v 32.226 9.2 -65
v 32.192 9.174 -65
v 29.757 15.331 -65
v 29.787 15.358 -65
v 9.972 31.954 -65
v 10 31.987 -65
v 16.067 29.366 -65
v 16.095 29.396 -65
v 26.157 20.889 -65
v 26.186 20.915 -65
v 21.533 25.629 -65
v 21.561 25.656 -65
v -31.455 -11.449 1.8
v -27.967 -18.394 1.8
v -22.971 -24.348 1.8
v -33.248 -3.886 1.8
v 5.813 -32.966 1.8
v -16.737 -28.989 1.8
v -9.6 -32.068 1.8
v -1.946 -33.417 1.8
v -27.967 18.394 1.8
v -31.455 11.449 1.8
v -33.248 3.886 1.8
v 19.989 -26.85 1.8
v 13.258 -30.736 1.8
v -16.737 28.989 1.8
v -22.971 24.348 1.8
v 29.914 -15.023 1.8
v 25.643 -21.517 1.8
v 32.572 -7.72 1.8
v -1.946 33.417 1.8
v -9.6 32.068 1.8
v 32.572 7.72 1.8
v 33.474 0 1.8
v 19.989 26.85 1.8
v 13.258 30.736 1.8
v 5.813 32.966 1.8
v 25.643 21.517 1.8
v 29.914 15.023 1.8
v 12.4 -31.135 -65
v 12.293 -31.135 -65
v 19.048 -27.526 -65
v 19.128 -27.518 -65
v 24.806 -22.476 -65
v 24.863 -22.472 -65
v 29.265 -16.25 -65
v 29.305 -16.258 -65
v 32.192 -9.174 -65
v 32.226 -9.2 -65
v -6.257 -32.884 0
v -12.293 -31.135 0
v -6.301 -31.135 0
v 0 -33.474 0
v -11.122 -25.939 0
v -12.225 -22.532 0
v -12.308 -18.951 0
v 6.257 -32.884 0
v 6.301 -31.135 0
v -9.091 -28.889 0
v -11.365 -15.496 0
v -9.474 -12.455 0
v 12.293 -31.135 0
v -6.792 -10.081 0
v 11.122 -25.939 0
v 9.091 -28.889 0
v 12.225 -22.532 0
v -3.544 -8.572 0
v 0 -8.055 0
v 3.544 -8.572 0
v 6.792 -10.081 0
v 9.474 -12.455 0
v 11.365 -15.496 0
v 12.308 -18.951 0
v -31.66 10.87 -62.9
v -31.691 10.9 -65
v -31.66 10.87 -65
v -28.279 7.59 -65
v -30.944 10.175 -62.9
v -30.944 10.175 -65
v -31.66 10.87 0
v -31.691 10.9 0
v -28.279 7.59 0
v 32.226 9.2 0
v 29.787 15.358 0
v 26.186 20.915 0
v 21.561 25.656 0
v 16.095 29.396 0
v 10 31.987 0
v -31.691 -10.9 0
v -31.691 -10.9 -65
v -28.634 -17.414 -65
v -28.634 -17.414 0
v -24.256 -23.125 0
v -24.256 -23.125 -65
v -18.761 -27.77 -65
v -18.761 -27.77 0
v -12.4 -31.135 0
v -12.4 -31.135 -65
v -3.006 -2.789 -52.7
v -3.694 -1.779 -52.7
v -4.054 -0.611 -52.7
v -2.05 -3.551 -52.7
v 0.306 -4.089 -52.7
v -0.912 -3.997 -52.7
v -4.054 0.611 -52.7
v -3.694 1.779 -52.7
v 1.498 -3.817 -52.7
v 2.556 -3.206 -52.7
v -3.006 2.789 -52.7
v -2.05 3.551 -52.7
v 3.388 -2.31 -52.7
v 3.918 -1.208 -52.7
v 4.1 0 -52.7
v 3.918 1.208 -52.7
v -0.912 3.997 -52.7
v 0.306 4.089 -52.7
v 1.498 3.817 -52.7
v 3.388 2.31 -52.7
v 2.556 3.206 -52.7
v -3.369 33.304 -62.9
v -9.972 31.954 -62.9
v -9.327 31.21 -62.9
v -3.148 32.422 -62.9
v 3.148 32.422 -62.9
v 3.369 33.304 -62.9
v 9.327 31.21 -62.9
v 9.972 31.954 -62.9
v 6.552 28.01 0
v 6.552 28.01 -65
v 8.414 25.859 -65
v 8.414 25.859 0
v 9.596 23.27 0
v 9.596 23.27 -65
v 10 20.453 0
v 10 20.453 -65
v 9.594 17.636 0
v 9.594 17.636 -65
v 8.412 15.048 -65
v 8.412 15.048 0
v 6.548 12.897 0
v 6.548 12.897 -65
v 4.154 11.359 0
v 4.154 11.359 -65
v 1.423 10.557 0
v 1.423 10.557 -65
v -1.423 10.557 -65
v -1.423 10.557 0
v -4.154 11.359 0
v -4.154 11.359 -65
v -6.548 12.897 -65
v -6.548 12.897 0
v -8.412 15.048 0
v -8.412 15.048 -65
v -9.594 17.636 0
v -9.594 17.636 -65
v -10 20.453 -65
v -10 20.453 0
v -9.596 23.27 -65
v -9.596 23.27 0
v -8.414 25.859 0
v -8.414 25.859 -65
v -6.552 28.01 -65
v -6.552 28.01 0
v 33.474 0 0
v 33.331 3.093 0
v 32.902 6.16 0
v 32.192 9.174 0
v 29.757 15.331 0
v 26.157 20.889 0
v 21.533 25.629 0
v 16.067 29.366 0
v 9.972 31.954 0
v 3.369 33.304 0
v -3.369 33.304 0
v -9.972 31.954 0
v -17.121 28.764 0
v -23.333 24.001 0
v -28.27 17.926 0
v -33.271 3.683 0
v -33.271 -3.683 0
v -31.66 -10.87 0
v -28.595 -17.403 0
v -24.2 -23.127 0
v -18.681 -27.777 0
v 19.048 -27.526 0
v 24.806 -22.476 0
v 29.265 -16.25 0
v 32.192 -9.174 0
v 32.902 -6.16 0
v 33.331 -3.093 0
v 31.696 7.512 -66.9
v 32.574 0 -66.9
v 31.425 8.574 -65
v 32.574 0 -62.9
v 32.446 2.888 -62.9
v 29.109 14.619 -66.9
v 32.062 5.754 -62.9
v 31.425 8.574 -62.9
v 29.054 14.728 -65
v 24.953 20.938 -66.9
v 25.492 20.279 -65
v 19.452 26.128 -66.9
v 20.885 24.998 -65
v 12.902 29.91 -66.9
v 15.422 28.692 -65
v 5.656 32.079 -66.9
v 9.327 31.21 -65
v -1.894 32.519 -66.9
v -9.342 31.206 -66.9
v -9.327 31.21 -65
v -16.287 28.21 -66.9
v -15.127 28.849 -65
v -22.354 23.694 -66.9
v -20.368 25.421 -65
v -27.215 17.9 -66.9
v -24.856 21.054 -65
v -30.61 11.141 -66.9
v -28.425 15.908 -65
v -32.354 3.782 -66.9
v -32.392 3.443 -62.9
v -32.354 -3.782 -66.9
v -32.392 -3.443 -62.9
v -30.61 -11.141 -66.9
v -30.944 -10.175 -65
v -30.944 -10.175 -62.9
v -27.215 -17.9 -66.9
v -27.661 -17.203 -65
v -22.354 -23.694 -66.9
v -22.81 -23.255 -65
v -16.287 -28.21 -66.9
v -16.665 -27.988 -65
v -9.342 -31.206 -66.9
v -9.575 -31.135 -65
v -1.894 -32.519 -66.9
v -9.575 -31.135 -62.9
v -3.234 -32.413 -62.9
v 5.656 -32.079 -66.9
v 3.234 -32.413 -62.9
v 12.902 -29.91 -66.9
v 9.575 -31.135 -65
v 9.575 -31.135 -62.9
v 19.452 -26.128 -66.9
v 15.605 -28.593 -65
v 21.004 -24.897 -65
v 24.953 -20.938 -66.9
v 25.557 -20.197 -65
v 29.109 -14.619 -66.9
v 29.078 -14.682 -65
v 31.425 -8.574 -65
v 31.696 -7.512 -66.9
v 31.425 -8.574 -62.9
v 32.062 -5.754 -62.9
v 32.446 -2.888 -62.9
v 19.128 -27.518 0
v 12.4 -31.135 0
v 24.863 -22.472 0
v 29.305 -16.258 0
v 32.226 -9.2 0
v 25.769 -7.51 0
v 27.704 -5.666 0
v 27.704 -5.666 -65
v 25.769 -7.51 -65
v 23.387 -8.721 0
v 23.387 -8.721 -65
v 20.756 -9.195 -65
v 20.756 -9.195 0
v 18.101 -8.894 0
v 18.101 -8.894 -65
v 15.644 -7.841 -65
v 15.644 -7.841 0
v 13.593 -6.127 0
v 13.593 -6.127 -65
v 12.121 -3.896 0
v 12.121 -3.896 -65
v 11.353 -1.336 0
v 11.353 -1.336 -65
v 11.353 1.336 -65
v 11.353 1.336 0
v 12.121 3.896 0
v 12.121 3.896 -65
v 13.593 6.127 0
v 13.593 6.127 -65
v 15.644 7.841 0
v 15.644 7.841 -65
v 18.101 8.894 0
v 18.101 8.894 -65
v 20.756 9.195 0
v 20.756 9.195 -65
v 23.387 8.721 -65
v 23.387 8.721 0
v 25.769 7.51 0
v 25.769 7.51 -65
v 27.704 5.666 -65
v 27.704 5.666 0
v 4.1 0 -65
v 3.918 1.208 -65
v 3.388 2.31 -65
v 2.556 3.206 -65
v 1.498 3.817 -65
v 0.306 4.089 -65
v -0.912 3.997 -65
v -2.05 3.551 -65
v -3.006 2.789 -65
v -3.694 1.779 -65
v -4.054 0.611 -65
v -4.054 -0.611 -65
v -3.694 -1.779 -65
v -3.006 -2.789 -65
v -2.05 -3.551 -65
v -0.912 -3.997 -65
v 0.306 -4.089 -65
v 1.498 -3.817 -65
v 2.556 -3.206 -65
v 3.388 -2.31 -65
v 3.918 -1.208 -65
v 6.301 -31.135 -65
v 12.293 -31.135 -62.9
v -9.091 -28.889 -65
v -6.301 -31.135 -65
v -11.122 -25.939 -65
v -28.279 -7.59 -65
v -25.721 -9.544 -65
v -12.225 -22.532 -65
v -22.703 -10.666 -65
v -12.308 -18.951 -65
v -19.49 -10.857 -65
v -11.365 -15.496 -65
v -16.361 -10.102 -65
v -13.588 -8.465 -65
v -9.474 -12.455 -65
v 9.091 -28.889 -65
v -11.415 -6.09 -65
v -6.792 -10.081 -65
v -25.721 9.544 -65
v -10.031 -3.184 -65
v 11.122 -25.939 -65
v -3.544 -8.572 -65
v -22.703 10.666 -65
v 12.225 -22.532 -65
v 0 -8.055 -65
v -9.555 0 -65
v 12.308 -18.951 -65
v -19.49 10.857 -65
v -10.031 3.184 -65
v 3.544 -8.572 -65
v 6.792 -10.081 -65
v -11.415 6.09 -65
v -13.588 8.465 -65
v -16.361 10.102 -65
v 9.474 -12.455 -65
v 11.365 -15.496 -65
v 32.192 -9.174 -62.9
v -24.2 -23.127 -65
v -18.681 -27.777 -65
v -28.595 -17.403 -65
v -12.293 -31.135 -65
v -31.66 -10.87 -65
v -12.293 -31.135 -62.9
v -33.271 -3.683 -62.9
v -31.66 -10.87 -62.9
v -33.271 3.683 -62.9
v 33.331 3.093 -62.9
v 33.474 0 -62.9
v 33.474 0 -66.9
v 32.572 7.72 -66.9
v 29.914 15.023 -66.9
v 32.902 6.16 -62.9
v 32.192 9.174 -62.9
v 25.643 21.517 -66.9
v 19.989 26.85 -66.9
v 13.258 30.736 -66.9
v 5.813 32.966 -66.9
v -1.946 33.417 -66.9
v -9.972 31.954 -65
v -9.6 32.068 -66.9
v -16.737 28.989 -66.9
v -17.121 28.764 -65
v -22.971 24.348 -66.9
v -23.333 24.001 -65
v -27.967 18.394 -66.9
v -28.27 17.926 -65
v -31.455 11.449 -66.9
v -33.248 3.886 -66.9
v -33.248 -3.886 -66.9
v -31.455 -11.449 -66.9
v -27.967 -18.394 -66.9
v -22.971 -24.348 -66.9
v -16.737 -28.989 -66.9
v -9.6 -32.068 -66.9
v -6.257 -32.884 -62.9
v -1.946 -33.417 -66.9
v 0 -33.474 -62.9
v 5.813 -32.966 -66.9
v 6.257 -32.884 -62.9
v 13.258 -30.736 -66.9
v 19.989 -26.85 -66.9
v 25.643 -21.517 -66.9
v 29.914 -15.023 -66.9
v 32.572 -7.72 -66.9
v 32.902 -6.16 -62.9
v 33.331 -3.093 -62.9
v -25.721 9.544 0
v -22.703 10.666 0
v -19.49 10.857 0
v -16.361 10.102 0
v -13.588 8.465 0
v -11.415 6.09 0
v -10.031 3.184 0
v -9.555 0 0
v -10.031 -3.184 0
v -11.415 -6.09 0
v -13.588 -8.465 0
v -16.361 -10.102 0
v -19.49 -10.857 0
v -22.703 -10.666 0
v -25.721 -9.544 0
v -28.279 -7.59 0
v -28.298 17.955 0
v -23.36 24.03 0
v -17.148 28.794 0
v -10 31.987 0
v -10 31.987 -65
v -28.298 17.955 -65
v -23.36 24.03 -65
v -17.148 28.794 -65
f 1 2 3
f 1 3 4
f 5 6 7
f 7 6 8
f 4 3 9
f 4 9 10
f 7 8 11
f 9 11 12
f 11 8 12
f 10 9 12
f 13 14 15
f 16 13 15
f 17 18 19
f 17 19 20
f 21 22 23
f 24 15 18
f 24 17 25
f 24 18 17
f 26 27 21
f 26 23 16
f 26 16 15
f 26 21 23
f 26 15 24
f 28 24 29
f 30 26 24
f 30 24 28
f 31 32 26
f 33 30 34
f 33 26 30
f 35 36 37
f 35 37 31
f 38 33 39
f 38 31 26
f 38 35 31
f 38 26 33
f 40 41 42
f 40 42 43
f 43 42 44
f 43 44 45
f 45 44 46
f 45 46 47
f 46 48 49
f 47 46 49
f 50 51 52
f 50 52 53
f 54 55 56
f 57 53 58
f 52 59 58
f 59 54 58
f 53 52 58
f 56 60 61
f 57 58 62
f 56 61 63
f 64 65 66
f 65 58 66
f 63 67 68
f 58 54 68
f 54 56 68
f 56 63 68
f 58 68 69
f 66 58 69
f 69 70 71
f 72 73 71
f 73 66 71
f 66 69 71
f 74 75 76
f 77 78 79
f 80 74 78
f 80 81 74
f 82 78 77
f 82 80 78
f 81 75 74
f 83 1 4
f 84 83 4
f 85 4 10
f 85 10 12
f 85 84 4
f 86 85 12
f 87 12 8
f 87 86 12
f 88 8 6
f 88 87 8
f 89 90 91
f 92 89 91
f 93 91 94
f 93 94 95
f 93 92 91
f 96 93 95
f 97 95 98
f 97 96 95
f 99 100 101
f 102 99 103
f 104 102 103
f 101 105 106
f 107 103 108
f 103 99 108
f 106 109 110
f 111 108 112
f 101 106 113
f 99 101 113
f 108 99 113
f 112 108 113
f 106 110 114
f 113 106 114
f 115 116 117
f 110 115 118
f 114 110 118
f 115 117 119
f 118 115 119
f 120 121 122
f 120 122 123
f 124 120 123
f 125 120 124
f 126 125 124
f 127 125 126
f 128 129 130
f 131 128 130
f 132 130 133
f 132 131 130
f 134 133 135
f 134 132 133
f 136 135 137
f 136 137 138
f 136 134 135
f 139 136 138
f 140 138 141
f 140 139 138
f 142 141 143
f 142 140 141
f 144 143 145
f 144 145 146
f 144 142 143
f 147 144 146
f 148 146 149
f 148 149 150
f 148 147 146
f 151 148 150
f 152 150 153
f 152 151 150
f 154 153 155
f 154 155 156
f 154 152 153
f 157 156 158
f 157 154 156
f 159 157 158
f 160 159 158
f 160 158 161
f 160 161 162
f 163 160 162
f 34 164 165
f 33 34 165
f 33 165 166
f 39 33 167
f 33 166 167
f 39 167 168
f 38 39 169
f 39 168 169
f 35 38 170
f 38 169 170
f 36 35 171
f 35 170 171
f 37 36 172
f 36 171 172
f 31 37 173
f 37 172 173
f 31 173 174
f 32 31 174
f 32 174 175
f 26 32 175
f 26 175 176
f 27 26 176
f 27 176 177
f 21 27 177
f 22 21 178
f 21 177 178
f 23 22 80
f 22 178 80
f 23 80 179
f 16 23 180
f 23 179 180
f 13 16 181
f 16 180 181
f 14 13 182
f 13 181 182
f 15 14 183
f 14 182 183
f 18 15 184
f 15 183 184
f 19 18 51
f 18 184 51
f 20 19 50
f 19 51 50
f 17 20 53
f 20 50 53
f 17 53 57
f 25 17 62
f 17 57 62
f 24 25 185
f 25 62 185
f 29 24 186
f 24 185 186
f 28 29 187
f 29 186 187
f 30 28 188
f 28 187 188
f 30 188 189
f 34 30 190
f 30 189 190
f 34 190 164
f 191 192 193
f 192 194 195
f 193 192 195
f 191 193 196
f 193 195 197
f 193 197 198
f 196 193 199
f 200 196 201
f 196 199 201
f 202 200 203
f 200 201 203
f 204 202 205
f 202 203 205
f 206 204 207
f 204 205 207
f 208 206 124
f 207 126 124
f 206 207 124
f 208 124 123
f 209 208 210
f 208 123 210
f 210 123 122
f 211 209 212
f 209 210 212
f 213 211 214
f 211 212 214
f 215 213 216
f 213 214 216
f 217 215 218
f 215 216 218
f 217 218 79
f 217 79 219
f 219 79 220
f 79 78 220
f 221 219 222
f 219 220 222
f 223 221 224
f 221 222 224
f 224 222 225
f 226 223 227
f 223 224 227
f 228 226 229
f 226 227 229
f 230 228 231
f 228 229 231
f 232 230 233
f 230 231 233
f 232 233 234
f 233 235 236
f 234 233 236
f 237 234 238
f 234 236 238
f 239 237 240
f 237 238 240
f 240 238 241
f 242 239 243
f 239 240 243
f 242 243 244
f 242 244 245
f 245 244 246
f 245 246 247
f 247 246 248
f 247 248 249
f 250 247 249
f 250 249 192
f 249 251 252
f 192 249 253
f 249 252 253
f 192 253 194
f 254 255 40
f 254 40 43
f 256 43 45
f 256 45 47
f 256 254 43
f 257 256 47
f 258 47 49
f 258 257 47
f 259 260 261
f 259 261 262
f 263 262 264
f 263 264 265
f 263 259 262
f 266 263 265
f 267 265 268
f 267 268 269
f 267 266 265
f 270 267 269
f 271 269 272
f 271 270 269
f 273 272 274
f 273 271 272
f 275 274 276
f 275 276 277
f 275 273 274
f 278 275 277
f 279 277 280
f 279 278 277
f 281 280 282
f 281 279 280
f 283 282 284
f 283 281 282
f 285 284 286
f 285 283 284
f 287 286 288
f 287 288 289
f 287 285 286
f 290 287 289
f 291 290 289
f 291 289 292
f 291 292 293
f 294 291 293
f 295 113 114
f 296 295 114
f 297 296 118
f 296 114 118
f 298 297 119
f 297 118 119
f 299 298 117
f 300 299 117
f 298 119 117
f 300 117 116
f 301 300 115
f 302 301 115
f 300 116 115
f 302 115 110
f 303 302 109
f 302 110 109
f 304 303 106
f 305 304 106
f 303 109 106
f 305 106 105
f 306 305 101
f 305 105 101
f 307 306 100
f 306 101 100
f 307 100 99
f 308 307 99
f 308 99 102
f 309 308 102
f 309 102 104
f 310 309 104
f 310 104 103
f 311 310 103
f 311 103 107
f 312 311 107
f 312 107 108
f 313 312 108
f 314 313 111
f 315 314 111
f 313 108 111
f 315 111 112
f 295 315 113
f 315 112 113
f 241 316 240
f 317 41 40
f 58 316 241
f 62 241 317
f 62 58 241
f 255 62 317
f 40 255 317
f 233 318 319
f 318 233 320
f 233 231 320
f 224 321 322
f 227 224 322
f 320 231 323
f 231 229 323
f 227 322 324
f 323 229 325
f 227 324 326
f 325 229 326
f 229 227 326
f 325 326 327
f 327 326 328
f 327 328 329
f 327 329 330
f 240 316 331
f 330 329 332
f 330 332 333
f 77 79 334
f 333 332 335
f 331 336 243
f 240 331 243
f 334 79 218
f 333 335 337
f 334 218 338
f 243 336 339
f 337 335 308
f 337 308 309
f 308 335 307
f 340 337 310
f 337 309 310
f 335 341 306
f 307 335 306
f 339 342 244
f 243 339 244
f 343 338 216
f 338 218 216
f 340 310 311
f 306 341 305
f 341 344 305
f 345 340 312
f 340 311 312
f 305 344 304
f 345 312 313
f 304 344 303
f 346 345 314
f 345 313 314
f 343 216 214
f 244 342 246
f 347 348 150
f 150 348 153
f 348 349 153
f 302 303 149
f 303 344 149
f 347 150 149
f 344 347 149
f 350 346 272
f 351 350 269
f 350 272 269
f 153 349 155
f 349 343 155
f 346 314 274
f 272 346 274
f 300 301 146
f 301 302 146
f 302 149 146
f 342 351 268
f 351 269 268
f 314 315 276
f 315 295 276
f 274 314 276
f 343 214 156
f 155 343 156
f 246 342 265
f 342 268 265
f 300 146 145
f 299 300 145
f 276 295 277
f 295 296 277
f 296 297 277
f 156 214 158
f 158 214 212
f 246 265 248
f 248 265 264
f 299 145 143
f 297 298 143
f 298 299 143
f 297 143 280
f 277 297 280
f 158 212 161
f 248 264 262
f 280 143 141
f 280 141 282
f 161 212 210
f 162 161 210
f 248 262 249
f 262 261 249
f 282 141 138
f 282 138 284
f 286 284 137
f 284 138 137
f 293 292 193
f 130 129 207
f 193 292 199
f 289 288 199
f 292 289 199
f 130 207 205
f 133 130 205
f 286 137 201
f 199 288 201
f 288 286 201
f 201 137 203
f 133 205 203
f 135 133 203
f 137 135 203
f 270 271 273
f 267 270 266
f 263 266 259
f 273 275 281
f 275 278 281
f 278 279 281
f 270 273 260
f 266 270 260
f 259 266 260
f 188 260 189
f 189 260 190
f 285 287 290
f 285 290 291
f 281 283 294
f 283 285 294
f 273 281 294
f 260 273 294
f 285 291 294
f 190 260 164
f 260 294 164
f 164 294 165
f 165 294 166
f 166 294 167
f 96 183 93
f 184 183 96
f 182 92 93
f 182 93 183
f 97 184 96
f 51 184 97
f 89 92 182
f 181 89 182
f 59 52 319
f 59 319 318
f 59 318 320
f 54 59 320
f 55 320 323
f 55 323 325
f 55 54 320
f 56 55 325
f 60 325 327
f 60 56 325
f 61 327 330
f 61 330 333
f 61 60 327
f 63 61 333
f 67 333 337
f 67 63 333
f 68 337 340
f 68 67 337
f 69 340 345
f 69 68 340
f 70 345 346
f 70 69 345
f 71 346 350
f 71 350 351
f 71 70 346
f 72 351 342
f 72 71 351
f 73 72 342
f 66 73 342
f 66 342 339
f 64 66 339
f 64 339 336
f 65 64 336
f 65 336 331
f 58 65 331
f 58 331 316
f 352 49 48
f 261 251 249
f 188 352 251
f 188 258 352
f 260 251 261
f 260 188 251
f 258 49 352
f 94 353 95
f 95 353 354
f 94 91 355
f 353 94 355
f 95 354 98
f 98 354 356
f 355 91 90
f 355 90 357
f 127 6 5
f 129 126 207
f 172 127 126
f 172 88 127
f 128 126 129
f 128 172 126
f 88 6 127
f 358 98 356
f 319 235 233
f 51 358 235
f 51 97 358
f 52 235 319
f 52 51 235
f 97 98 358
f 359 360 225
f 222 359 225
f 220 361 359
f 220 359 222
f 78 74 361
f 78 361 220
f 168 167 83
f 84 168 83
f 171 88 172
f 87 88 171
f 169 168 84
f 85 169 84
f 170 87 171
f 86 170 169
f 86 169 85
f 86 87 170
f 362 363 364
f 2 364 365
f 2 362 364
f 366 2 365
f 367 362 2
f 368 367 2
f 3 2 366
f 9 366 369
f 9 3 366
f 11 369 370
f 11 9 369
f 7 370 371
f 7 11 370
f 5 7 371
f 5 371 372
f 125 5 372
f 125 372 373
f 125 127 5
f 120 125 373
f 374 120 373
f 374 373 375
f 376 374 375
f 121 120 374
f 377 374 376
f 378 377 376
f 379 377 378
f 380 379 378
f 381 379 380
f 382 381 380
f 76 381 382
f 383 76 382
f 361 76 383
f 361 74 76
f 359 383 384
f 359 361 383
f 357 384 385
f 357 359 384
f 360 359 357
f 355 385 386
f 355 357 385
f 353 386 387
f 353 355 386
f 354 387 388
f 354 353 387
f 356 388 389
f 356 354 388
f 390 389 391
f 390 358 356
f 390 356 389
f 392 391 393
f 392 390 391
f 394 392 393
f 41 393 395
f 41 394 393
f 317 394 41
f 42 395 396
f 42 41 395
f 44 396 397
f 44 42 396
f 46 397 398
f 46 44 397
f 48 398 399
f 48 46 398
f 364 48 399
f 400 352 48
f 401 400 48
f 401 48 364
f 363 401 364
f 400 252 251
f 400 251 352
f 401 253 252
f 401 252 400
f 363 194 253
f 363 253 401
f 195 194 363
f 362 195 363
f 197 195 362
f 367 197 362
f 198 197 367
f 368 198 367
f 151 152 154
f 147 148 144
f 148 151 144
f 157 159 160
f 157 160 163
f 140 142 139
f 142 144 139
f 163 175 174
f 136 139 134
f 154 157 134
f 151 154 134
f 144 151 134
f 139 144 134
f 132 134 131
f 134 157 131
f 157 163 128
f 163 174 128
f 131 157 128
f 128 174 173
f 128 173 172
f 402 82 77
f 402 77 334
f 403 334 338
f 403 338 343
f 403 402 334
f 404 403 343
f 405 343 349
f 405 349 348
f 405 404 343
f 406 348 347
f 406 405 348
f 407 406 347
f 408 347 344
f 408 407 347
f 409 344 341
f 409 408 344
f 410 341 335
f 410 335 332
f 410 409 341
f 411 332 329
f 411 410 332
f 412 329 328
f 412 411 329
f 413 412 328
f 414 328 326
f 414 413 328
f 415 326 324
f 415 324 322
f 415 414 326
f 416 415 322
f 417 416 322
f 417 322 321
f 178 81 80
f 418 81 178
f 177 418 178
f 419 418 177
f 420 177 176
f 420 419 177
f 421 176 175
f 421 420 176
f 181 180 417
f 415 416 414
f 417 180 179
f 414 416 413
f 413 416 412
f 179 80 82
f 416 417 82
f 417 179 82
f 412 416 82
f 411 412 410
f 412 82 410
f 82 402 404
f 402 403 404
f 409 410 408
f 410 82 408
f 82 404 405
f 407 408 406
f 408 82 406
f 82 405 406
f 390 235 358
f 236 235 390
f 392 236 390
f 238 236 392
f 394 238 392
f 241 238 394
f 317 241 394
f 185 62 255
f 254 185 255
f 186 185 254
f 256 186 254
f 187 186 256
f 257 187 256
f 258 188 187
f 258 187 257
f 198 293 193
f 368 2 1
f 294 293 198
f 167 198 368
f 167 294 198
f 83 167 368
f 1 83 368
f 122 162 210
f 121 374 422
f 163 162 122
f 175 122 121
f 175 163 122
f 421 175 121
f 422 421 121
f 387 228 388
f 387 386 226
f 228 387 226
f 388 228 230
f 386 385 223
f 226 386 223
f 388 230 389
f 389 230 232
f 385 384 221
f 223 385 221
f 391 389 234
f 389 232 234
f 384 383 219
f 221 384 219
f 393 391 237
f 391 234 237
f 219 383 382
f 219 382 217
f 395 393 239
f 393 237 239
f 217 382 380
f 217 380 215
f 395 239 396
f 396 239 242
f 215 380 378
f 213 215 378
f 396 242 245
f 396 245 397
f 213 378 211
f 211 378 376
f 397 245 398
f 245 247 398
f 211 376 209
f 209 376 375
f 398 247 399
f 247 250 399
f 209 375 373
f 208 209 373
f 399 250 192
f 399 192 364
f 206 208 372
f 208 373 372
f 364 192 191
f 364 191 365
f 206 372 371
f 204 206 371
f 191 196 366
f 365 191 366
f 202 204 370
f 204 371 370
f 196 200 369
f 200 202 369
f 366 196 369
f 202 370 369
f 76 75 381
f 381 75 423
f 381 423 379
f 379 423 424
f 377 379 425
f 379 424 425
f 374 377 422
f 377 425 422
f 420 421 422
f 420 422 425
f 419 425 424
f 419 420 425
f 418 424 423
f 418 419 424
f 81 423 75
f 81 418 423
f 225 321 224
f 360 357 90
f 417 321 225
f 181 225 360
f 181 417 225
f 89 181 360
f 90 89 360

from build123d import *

# Parameters (mm, degrees)
F1_DEPTH = 65
F2_R     = 33.47406
F3_DEPTH = 1.8
F5_START = -62.9
F4_R     = 33.47406
F4_R_2   = 32.57406
F5_DEPTH = 4
F7_START = -52.7
F6_R     = 4.1
F7_DEPTH = 12.3


with BuildPart() as f1:
    # F0 (on Top) → F1 (new body)
    with BuildSketch(Plane.XY):
        with BuildLine():
            ThreePointArc((-6.301205687, -31.1349322809), (0, -8.0552877694), (6.301205687, -31.1349322809))
            Line((6.301205687, -31.1349322809), (12.4, -31.1349322809))
            ThreePointArc((12.4, -31.1349322809), (24.8626517269, -22.4720394544), (32.2258282769, -9.2))
            Line((32.2258282769, -9.2), (27.7038375399, -5.6655561268))
            ThreePointArc((27.7038375399, -5.6655561268), (11.2552877694, 0), (27.7038375399, 5.6655561268))
            Line((27.7038375399, 5.6655561268), (32.2258282769, 9.2))
            ThreePointArc((32.2258282769, 9.2), (23.9908874936, 23.4004556666), (10, 31.9866223308))
            Line((10, 31.9866223308), (6.5516160367, 28.0101754131))
            ThreePointArc((6.5516160367, 28.0101754131), (0, 10.4552877694), (-6.5516160367, 28.0101754131))
            Line((-6.5516160367, 28.0101754131), (-10, 31.9866223308))
            ThreePointArc((-10, 31.9866223308), (-23.3602452547, 24.0300426503), (-31.6912291989, 10.9))
            Line((-31.6912291989, 10.9), (-28.2788214738, 7.5896192511))
            ThreePointArc((-28.2788214738, 7.5896192511), (-9.5552877694, 0), (-28.2788214738, -7.5896192511))
            Line((-28.2788214738, -7.5896192511), (-31.6912291989, -10.9))
            ThreePointArc((-31.6912291989, -10.9), (-24.256385637, -23.125132734), (-12.4, -31.1349322809))
            Line((-12.4, -31.1349322809), (-6.301205687, -31.1349322809))
        make_face()
    extrude(amount=-F1_DEPTH)

    # F2 (on Top) → F3 (join)
    with BuildSketch(Plane.XY):
        Circle(F2_R)
    extrude(amount=F3_DEPTH)

    # F4 (on Top) → F5 (join)
    with BuildSketch(Plane.XY.offset(F5_START)):
        Circle(F4_R)
        Circle(F4_R_2, mode=Mode.SUBTRACT)
    extrude(amount=-F5_DEPTH)

    # F6 (on Top) → F7 (cut)
    with BuildSketch(Plane.XY.offset(F7_START)):
        Circle(F6_R)
    extrude(amount=-F7_DEPTH, mode=Mode.SUBTRACT)


solid = f1.part
